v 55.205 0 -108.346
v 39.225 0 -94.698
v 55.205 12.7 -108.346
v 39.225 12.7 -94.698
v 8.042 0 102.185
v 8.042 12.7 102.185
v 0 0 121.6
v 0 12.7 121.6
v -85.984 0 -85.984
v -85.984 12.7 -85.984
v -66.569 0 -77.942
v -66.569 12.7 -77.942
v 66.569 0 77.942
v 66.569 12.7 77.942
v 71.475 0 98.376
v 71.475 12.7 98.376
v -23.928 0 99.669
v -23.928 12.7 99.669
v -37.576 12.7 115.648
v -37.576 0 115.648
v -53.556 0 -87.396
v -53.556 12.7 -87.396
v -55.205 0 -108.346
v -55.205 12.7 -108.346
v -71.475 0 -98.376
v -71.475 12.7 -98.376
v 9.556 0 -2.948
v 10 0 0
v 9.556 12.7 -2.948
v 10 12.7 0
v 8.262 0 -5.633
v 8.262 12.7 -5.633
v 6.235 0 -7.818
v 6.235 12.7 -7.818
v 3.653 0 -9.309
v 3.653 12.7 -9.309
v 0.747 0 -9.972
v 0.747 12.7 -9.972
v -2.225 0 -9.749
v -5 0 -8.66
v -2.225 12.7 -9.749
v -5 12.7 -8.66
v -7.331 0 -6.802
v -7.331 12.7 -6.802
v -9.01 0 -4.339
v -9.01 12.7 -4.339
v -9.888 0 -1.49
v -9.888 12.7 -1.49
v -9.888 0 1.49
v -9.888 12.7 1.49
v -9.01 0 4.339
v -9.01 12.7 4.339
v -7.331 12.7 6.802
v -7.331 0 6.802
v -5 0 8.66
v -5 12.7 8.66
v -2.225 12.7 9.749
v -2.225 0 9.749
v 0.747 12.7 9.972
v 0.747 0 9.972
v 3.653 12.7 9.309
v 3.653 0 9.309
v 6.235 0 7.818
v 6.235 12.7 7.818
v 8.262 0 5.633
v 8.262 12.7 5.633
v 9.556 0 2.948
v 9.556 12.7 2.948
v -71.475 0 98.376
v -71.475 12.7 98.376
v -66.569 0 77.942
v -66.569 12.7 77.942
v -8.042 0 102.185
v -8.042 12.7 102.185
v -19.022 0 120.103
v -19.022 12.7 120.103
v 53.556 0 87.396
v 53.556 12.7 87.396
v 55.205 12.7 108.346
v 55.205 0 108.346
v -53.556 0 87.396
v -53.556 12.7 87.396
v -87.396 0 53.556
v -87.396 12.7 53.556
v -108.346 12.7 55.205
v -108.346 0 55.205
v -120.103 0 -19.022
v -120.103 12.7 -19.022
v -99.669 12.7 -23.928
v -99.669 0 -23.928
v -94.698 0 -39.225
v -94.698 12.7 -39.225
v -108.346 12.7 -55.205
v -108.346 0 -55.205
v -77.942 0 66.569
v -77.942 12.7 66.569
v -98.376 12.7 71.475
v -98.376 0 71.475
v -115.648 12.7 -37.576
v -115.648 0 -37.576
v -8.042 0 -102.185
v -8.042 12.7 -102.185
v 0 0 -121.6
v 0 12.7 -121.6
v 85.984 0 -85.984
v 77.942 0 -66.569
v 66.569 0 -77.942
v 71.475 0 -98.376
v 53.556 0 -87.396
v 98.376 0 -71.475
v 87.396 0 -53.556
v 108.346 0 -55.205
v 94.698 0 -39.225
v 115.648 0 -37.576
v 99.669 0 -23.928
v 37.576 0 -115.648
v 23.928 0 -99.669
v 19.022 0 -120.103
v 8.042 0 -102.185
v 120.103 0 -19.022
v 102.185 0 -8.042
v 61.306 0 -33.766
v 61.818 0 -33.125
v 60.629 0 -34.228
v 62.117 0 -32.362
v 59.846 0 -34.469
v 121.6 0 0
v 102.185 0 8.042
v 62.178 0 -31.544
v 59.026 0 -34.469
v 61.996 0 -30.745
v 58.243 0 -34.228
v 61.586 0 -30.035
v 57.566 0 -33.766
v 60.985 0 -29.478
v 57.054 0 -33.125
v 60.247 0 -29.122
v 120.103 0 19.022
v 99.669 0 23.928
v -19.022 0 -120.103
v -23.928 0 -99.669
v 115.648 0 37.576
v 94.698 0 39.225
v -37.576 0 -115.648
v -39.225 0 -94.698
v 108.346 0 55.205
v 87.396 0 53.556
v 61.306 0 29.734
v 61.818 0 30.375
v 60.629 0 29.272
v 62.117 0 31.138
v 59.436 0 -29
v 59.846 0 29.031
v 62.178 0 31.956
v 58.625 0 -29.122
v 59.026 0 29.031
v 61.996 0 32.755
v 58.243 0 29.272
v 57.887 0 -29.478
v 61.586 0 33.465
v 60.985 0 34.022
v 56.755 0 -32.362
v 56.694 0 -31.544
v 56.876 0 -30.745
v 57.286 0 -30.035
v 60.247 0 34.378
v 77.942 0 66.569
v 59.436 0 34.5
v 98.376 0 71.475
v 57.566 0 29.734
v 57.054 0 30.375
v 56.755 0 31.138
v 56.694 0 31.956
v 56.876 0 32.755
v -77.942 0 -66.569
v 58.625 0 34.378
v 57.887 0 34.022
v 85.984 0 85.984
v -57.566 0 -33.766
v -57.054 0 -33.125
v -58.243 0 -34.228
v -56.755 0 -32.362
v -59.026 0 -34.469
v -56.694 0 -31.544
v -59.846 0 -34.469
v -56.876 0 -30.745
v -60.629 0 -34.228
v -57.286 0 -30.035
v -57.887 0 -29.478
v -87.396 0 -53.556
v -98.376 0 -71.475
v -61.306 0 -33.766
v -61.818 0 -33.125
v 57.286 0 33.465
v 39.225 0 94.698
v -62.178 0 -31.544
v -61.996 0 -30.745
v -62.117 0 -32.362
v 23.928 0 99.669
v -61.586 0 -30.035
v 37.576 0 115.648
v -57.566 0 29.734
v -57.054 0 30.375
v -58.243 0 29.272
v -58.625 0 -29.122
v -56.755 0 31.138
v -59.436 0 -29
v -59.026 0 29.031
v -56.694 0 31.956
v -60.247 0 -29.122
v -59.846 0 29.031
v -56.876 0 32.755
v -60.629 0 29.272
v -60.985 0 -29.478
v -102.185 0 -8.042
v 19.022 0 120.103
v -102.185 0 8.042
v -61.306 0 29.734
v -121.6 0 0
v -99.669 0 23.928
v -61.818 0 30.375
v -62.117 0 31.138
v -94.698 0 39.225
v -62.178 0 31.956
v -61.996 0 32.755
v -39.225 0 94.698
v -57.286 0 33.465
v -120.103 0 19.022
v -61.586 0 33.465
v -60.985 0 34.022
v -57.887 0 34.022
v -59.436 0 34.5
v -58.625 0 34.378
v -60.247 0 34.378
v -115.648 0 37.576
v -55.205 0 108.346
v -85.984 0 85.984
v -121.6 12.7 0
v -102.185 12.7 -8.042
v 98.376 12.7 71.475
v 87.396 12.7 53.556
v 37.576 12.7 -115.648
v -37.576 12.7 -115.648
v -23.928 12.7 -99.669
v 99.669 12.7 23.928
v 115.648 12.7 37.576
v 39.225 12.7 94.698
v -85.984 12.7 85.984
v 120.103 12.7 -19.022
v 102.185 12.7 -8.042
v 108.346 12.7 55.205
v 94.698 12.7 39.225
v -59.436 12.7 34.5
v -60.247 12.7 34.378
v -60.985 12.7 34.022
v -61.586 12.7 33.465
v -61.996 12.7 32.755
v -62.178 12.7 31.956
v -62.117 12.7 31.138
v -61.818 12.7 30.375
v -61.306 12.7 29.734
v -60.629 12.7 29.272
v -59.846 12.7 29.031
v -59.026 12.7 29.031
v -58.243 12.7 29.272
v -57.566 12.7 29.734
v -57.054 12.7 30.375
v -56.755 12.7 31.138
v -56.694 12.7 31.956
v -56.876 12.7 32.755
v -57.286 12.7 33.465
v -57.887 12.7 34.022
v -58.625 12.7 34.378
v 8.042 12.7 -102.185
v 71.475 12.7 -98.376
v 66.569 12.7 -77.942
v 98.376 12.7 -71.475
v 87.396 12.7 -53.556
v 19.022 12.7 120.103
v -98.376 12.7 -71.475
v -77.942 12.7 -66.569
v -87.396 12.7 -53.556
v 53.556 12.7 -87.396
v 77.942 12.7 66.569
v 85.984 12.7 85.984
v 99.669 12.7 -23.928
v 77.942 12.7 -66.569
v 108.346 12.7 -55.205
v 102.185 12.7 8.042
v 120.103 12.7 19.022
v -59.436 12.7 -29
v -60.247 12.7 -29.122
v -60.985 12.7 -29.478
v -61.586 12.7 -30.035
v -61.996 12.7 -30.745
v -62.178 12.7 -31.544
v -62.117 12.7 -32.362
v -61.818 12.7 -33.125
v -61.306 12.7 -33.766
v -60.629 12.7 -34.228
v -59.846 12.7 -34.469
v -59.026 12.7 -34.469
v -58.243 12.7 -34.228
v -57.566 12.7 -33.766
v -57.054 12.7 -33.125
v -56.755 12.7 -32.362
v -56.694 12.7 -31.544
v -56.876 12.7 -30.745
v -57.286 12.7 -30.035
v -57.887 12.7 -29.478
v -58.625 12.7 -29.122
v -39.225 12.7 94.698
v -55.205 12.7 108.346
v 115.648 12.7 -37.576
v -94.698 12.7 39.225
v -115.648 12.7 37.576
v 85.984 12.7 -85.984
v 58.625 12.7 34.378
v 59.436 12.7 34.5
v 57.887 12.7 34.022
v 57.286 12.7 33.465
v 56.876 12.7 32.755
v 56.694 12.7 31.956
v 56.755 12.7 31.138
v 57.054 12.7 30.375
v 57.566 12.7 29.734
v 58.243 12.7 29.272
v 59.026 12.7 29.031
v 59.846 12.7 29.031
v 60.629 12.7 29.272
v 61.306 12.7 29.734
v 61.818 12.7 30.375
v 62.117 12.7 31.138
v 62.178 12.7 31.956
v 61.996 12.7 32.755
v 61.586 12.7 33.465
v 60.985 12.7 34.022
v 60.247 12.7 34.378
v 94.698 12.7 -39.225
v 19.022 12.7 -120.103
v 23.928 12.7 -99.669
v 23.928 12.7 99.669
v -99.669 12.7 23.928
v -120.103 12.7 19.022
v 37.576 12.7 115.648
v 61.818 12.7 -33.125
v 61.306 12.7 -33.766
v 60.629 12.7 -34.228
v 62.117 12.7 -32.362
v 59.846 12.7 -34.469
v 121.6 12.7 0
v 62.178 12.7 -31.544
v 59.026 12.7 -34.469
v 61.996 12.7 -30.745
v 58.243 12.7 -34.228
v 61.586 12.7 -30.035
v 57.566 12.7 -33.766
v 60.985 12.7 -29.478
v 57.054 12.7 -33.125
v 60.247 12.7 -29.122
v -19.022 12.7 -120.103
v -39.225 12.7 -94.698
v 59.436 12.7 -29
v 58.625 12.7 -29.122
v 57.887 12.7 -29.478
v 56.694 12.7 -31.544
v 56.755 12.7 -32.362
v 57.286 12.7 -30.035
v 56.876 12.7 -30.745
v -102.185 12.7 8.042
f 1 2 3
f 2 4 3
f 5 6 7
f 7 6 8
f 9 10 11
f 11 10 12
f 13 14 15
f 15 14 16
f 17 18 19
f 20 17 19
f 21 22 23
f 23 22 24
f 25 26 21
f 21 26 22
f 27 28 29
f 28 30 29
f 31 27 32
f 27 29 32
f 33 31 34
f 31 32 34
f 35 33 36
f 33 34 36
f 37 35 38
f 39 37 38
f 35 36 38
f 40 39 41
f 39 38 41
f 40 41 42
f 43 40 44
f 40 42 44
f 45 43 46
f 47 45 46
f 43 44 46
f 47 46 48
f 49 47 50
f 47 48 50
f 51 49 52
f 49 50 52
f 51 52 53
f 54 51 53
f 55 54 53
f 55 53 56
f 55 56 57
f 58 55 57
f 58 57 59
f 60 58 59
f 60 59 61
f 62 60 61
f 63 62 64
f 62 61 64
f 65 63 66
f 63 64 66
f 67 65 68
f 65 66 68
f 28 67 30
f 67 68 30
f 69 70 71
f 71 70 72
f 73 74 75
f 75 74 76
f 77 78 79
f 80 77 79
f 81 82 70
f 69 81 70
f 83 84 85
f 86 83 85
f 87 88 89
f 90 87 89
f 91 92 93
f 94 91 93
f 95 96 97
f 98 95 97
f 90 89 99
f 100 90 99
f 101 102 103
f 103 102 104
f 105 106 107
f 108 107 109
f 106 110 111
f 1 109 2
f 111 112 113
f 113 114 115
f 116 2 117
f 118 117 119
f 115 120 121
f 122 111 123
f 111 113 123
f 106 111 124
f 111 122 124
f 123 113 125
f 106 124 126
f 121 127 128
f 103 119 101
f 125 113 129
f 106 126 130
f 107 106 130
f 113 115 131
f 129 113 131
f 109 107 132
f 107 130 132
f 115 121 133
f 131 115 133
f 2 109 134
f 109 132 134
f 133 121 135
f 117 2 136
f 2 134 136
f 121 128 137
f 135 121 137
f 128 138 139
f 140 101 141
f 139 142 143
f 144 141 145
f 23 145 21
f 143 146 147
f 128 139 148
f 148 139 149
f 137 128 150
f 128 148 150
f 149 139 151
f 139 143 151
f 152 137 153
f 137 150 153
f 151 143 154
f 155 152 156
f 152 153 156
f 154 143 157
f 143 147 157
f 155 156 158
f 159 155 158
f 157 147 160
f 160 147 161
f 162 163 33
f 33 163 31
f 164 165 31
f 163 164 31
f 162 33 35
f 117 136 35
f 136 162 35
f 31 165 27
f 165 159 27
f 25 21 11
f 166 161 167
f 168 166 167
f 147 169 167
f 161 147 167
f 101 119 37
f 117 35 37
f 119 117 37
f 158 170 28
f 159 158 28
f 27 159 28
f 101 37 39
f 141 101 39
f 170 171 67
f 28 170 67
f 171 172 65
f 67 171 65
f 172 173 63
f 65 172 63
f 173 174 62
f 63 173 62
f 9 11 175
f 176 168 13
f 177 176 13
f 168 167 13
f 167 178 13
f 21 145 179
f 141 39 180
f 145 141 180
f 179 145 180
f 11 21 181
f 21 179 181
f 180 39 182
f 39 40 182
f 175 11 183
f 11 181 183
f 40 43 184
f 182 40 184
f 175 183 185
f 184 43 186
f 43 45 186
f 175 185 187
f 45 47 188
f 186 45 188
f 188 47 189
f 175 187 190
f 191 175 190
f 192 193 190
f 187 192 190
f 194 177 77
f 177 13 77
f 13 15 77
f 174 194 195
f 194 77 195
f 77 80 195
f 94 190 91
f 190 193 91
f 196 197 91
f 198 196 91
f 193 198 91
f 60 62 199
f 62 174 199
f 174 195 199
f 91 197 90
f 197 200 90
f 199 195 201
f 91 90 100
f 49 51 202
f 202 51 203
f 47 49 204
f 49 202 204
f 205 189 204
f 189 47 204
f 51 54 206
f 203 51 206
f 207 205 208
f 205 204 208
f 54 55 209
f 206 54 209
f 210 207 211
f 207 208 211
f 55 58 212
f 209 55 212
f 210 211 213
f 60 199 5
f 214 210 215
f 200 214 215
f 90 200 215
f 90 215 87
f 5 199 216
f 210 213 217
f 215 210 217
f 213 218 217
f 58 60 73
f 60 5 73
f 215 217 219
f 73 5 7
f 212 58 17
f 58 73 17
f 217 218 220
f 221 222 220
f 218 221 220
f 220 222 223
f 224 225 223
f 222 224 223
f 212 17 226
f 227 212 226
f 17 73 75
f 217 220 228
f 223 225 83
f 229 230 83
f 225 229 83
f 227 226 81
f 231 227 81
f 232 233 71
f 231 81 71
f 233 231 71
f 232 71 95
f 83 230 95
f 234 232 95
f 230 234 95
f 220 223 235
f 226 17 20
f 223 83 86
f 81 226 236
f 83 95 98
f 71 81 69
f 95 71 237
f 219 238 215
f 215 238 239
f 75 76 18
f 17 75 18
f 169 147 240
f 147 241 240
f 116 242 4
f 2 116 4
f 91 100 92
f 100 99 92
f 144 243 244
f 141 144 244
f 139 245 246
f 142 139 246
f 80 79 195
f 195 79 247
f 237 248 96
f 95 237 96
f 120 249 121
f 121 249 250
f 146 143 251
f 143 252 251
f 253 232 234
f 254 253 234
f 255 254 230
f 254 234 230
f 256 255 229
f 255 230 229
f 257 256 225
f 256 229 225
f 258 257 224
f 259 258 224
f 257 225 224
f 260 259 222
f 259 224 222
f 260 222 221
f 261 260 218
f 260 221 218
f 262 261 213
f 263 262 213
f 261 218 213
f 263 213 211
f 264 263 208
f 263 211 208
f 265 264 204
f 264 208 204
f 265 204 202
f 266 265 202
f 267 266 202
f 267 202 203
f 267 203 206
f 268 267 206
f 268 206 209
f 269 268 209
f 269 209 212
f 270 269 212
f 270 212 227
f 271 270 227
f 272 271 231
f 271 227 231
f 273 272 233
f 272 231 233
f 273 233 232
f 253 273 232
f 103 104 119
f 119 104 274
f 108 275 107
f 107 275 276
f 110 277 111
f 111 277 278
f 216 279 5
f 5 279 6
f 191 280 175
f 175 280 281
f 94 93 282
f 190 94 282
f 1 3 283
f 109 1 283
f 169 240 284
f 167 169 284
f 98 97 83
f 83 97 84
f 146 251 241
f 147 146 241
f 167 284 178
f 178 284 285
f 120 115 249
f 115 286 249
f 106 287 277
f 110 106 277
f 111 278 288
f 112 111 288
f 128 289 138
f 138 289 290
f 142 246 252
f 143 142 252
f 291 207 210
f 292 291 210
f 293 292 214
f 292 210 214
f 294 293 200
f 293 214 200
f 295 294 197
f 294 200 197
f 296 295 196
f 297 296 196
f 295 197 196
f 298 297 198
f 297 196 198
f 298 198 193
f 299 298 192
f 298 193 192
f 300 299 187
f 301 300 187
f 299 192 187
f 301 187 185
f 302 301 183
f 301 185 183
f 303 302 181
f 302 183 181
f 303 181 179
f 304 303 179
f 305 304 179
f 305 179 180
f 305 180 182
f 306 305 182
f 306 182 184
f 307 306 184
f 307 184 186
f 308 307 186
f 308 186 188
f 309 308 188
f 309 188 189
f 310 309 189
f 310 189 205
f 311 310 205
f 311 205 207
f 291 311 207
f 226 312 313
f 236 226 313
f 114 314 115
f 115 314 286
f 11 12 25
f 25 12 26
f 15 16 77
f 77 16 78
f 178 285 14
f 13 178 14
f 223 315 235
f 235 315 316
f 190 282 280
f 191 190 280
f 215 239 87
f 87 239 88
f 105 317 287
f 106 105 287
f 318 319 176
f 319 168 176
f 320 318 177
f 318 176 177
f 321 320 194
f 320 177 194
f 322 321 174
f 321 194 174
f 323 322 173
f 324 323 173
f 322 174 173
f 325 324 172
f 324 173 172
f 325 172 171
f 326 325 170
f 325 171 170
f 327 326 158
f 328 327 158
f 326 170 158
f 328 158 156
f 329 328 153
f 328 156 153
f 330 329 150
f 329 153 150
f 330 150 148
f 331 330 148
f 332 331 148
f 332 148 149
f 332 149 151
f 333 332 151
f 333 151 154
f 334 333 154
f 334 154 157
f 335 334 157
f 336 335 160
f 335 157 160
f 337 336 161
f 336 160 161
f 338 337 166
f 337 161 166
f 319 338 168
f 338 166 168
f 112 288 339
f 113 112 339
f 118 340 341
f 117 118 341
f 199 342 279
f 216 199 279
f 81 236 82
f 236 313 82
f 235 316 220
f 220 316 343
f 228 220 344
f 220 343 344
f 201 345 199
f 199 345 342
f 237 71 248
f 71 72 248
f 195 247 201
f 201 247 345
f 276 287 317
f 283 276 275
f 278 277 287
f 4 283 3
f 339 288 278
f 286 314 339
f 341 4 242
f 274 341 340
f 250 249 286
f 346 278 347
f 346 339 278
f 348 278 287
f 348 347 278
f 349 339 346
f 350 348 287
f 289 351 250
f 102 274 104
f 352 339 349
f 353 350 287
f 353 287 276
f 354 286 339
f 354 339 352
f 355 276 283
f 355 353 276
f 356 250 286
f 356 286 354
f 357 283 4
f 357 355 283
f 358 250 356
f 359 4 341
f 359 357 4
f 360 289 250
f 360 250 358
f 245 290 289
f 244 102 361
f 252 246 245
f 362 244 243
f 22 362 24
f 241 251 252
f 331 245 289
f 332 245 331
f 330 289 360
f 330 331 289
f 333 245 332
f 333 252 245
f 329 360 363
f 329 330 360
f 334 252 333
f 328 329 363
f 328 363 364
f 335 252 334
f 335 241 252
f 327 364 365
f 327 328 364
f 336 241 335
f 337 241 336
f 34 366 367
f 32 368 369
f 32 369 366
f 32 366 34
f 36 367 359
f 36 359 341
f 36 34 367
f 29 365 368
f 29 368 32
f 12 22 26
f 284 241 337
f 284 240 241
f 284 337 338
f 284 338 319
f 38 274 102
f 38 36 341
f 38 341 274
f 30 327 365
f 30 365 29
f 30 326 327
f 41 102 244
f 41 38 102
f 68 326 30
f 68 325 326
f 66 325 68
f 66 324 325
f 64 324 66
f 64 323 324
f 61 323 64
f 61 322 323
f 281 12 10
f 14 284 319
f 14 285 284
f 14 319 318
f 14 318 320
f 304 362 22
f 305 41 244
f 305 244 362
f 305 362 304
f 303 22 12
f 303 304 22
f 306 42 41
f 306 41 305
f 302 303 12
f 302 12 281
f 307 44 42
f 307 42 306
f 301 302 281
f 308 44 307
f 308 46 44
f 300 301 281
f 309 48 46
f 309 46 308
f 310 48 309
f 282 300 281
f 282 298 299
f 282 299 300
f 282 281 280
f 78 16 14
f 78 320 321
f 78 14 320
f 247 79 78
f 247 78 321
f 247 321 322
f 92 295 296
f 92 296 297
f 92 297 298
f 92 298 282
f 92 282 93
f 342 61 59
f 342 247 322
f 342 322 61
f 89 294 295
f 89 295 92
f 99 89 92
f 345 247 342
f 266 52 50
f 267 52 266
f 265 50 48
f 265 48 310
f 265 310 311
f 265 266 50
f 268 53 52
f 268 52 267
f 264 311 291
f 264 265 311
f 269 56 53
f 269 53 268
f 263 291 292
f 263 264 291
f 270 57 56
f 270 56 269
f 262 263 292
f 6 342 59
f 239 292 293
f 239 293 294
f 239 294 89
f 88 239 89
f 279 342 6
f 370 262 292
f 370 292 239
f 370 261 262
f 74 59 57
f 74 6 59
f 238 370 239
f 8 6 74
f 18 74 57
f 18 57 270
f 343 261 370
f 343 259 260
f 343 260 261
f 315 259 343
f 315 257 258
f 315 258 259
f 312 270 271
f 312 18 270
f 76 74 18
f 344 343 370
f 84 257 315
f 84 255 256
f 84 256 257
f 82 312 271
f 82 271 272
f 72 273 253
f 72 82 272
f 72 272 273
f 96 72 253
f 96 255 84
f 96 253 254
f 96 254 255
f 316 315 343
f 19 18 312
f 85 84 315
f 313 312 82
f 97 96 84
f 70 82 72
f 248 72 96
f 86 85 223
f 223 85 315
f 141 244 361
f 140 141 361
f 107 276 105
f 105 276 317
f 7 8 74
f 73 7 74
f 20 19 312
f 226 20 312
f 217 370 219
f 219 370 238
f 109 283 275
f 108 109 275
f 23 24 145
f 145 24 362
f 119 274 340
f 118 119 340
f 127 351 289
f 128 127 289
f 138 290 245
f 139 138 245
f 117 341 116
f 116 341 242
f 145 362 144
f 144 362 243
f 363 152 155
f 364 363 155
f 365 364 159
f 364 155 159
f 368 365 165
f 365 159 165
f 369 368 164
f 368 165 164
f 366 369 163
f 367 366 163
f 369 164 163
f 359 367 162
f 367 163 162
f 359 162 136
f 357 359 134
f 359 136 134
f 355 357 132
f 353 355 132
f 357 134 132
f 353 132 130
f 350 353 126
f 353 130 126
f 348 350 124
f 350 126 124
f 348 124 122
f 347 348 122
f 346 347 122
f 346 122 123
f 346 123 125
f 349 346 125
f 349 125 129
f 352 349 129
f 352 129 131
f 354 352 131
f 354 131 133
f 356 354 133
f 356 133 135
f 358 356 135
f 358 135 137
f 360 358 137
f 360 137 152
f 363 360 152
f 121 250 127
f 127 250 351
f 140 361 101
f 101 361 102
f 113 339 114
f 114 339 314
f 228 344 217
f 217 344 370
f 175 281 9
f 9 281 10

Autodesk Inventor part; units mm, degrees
ref_plane "YZ Plane" through (0, 0, 0) normal (1, 0, 0) x (0, 1, 0)
ref_plane "XZ Plane" through (0, 0, 0) normal (0, 1, 0) x (-1, 0, 0)
ref_plane "XY Plane" through (0, 0, 0) normal (0, 0, 1) x (1, 0, 0)
sketch "Sketch1" plane through (0, 0, 0) normal (0, 1, 0) x (-1, 0, 0)
  circle A0 centre (0, 0) radius 101.6
  dimension "d0" = 203.2
extrude "Extrusion1" add sketch "Sketch1" along normal blind 12.7
sketch "Sketch2" plane through (0, 12.7, 0) normal (0, 1, 0) x (1, 0, 0)
  line L0 (-8.4294, 101.2497) -> (0, 121.6)
  line L1 (0, 121.6) -> (8.4294, 101.2497)
  circle A0 centre (0, 0) radius 101.6 projected
  line L2 (0, 0) -> (0, 122.8461)
  circle A1 centre (0, 0) radius 101.6 projected
  arc A2 (8.4294, 101.2497) -> (-8.4294, 101.2497) centre (0, 0) ccw
  point P0 (0, 101.6)
  dimension "d3" = 45
  dimension "d4" = 20
extrude "Extrusion2" add sketch "Sketch2" against normal up to surface (12.7 mm away) contours L0 L2 A0 | L1 A0 L2
pattern_circular "Circular Pattern1" count 40 over 360 about axis through (0, 0, 0) along (0, 1, 0) of "Extrusion2"
sketch "Sketch3" plane through (0, 12.7, 0) normal (0, 1, 0) x (1, 0, 0)
  circle A0 centre (0, 0) radius 10
  dimension "d10" = 20
extrude "Extrusion3" cut sketch "Sketch3" against normal through all
sketch "Sketch5" plane through (0, 12.7, 0) normal (0, 1, 0) x (1, 0, 0)
  line L0 (-59.436, 31.75) -> (59.436, 31.75)
  line L1 (59.436, 31.75) -> (59.436, -31.75)
  line L2 (59.436, -31.75) -> (-59.436, -31.75)
  line L3 (-59.436, -31.75) -> (-59.436, 31.75)
  circle A0 centre (0, 0) radius 10 projected
  line L4 (-59.436, 31.75) -> (59.436, -31.75) construction
  line L5 (59.436, 31.75) -> (-59.436, -31.75) construction
  dimension "d22" = 63.5
  dimension "d23" = 118.872
hole "Hole1" at (-59.436, 12.7, -31.75) at (-59.436, 12.7, 31.75) at (59.436, 12.7, 31.75) at (59.436, 12.7, -31.75) direction (0, -1, 0) diameter 5.5 end through all clearance for "Countersunk Flat Head Screw ISO 2009/7046" size "M5" standard "ISO"
properties part number "BIG ASS GEAR"
